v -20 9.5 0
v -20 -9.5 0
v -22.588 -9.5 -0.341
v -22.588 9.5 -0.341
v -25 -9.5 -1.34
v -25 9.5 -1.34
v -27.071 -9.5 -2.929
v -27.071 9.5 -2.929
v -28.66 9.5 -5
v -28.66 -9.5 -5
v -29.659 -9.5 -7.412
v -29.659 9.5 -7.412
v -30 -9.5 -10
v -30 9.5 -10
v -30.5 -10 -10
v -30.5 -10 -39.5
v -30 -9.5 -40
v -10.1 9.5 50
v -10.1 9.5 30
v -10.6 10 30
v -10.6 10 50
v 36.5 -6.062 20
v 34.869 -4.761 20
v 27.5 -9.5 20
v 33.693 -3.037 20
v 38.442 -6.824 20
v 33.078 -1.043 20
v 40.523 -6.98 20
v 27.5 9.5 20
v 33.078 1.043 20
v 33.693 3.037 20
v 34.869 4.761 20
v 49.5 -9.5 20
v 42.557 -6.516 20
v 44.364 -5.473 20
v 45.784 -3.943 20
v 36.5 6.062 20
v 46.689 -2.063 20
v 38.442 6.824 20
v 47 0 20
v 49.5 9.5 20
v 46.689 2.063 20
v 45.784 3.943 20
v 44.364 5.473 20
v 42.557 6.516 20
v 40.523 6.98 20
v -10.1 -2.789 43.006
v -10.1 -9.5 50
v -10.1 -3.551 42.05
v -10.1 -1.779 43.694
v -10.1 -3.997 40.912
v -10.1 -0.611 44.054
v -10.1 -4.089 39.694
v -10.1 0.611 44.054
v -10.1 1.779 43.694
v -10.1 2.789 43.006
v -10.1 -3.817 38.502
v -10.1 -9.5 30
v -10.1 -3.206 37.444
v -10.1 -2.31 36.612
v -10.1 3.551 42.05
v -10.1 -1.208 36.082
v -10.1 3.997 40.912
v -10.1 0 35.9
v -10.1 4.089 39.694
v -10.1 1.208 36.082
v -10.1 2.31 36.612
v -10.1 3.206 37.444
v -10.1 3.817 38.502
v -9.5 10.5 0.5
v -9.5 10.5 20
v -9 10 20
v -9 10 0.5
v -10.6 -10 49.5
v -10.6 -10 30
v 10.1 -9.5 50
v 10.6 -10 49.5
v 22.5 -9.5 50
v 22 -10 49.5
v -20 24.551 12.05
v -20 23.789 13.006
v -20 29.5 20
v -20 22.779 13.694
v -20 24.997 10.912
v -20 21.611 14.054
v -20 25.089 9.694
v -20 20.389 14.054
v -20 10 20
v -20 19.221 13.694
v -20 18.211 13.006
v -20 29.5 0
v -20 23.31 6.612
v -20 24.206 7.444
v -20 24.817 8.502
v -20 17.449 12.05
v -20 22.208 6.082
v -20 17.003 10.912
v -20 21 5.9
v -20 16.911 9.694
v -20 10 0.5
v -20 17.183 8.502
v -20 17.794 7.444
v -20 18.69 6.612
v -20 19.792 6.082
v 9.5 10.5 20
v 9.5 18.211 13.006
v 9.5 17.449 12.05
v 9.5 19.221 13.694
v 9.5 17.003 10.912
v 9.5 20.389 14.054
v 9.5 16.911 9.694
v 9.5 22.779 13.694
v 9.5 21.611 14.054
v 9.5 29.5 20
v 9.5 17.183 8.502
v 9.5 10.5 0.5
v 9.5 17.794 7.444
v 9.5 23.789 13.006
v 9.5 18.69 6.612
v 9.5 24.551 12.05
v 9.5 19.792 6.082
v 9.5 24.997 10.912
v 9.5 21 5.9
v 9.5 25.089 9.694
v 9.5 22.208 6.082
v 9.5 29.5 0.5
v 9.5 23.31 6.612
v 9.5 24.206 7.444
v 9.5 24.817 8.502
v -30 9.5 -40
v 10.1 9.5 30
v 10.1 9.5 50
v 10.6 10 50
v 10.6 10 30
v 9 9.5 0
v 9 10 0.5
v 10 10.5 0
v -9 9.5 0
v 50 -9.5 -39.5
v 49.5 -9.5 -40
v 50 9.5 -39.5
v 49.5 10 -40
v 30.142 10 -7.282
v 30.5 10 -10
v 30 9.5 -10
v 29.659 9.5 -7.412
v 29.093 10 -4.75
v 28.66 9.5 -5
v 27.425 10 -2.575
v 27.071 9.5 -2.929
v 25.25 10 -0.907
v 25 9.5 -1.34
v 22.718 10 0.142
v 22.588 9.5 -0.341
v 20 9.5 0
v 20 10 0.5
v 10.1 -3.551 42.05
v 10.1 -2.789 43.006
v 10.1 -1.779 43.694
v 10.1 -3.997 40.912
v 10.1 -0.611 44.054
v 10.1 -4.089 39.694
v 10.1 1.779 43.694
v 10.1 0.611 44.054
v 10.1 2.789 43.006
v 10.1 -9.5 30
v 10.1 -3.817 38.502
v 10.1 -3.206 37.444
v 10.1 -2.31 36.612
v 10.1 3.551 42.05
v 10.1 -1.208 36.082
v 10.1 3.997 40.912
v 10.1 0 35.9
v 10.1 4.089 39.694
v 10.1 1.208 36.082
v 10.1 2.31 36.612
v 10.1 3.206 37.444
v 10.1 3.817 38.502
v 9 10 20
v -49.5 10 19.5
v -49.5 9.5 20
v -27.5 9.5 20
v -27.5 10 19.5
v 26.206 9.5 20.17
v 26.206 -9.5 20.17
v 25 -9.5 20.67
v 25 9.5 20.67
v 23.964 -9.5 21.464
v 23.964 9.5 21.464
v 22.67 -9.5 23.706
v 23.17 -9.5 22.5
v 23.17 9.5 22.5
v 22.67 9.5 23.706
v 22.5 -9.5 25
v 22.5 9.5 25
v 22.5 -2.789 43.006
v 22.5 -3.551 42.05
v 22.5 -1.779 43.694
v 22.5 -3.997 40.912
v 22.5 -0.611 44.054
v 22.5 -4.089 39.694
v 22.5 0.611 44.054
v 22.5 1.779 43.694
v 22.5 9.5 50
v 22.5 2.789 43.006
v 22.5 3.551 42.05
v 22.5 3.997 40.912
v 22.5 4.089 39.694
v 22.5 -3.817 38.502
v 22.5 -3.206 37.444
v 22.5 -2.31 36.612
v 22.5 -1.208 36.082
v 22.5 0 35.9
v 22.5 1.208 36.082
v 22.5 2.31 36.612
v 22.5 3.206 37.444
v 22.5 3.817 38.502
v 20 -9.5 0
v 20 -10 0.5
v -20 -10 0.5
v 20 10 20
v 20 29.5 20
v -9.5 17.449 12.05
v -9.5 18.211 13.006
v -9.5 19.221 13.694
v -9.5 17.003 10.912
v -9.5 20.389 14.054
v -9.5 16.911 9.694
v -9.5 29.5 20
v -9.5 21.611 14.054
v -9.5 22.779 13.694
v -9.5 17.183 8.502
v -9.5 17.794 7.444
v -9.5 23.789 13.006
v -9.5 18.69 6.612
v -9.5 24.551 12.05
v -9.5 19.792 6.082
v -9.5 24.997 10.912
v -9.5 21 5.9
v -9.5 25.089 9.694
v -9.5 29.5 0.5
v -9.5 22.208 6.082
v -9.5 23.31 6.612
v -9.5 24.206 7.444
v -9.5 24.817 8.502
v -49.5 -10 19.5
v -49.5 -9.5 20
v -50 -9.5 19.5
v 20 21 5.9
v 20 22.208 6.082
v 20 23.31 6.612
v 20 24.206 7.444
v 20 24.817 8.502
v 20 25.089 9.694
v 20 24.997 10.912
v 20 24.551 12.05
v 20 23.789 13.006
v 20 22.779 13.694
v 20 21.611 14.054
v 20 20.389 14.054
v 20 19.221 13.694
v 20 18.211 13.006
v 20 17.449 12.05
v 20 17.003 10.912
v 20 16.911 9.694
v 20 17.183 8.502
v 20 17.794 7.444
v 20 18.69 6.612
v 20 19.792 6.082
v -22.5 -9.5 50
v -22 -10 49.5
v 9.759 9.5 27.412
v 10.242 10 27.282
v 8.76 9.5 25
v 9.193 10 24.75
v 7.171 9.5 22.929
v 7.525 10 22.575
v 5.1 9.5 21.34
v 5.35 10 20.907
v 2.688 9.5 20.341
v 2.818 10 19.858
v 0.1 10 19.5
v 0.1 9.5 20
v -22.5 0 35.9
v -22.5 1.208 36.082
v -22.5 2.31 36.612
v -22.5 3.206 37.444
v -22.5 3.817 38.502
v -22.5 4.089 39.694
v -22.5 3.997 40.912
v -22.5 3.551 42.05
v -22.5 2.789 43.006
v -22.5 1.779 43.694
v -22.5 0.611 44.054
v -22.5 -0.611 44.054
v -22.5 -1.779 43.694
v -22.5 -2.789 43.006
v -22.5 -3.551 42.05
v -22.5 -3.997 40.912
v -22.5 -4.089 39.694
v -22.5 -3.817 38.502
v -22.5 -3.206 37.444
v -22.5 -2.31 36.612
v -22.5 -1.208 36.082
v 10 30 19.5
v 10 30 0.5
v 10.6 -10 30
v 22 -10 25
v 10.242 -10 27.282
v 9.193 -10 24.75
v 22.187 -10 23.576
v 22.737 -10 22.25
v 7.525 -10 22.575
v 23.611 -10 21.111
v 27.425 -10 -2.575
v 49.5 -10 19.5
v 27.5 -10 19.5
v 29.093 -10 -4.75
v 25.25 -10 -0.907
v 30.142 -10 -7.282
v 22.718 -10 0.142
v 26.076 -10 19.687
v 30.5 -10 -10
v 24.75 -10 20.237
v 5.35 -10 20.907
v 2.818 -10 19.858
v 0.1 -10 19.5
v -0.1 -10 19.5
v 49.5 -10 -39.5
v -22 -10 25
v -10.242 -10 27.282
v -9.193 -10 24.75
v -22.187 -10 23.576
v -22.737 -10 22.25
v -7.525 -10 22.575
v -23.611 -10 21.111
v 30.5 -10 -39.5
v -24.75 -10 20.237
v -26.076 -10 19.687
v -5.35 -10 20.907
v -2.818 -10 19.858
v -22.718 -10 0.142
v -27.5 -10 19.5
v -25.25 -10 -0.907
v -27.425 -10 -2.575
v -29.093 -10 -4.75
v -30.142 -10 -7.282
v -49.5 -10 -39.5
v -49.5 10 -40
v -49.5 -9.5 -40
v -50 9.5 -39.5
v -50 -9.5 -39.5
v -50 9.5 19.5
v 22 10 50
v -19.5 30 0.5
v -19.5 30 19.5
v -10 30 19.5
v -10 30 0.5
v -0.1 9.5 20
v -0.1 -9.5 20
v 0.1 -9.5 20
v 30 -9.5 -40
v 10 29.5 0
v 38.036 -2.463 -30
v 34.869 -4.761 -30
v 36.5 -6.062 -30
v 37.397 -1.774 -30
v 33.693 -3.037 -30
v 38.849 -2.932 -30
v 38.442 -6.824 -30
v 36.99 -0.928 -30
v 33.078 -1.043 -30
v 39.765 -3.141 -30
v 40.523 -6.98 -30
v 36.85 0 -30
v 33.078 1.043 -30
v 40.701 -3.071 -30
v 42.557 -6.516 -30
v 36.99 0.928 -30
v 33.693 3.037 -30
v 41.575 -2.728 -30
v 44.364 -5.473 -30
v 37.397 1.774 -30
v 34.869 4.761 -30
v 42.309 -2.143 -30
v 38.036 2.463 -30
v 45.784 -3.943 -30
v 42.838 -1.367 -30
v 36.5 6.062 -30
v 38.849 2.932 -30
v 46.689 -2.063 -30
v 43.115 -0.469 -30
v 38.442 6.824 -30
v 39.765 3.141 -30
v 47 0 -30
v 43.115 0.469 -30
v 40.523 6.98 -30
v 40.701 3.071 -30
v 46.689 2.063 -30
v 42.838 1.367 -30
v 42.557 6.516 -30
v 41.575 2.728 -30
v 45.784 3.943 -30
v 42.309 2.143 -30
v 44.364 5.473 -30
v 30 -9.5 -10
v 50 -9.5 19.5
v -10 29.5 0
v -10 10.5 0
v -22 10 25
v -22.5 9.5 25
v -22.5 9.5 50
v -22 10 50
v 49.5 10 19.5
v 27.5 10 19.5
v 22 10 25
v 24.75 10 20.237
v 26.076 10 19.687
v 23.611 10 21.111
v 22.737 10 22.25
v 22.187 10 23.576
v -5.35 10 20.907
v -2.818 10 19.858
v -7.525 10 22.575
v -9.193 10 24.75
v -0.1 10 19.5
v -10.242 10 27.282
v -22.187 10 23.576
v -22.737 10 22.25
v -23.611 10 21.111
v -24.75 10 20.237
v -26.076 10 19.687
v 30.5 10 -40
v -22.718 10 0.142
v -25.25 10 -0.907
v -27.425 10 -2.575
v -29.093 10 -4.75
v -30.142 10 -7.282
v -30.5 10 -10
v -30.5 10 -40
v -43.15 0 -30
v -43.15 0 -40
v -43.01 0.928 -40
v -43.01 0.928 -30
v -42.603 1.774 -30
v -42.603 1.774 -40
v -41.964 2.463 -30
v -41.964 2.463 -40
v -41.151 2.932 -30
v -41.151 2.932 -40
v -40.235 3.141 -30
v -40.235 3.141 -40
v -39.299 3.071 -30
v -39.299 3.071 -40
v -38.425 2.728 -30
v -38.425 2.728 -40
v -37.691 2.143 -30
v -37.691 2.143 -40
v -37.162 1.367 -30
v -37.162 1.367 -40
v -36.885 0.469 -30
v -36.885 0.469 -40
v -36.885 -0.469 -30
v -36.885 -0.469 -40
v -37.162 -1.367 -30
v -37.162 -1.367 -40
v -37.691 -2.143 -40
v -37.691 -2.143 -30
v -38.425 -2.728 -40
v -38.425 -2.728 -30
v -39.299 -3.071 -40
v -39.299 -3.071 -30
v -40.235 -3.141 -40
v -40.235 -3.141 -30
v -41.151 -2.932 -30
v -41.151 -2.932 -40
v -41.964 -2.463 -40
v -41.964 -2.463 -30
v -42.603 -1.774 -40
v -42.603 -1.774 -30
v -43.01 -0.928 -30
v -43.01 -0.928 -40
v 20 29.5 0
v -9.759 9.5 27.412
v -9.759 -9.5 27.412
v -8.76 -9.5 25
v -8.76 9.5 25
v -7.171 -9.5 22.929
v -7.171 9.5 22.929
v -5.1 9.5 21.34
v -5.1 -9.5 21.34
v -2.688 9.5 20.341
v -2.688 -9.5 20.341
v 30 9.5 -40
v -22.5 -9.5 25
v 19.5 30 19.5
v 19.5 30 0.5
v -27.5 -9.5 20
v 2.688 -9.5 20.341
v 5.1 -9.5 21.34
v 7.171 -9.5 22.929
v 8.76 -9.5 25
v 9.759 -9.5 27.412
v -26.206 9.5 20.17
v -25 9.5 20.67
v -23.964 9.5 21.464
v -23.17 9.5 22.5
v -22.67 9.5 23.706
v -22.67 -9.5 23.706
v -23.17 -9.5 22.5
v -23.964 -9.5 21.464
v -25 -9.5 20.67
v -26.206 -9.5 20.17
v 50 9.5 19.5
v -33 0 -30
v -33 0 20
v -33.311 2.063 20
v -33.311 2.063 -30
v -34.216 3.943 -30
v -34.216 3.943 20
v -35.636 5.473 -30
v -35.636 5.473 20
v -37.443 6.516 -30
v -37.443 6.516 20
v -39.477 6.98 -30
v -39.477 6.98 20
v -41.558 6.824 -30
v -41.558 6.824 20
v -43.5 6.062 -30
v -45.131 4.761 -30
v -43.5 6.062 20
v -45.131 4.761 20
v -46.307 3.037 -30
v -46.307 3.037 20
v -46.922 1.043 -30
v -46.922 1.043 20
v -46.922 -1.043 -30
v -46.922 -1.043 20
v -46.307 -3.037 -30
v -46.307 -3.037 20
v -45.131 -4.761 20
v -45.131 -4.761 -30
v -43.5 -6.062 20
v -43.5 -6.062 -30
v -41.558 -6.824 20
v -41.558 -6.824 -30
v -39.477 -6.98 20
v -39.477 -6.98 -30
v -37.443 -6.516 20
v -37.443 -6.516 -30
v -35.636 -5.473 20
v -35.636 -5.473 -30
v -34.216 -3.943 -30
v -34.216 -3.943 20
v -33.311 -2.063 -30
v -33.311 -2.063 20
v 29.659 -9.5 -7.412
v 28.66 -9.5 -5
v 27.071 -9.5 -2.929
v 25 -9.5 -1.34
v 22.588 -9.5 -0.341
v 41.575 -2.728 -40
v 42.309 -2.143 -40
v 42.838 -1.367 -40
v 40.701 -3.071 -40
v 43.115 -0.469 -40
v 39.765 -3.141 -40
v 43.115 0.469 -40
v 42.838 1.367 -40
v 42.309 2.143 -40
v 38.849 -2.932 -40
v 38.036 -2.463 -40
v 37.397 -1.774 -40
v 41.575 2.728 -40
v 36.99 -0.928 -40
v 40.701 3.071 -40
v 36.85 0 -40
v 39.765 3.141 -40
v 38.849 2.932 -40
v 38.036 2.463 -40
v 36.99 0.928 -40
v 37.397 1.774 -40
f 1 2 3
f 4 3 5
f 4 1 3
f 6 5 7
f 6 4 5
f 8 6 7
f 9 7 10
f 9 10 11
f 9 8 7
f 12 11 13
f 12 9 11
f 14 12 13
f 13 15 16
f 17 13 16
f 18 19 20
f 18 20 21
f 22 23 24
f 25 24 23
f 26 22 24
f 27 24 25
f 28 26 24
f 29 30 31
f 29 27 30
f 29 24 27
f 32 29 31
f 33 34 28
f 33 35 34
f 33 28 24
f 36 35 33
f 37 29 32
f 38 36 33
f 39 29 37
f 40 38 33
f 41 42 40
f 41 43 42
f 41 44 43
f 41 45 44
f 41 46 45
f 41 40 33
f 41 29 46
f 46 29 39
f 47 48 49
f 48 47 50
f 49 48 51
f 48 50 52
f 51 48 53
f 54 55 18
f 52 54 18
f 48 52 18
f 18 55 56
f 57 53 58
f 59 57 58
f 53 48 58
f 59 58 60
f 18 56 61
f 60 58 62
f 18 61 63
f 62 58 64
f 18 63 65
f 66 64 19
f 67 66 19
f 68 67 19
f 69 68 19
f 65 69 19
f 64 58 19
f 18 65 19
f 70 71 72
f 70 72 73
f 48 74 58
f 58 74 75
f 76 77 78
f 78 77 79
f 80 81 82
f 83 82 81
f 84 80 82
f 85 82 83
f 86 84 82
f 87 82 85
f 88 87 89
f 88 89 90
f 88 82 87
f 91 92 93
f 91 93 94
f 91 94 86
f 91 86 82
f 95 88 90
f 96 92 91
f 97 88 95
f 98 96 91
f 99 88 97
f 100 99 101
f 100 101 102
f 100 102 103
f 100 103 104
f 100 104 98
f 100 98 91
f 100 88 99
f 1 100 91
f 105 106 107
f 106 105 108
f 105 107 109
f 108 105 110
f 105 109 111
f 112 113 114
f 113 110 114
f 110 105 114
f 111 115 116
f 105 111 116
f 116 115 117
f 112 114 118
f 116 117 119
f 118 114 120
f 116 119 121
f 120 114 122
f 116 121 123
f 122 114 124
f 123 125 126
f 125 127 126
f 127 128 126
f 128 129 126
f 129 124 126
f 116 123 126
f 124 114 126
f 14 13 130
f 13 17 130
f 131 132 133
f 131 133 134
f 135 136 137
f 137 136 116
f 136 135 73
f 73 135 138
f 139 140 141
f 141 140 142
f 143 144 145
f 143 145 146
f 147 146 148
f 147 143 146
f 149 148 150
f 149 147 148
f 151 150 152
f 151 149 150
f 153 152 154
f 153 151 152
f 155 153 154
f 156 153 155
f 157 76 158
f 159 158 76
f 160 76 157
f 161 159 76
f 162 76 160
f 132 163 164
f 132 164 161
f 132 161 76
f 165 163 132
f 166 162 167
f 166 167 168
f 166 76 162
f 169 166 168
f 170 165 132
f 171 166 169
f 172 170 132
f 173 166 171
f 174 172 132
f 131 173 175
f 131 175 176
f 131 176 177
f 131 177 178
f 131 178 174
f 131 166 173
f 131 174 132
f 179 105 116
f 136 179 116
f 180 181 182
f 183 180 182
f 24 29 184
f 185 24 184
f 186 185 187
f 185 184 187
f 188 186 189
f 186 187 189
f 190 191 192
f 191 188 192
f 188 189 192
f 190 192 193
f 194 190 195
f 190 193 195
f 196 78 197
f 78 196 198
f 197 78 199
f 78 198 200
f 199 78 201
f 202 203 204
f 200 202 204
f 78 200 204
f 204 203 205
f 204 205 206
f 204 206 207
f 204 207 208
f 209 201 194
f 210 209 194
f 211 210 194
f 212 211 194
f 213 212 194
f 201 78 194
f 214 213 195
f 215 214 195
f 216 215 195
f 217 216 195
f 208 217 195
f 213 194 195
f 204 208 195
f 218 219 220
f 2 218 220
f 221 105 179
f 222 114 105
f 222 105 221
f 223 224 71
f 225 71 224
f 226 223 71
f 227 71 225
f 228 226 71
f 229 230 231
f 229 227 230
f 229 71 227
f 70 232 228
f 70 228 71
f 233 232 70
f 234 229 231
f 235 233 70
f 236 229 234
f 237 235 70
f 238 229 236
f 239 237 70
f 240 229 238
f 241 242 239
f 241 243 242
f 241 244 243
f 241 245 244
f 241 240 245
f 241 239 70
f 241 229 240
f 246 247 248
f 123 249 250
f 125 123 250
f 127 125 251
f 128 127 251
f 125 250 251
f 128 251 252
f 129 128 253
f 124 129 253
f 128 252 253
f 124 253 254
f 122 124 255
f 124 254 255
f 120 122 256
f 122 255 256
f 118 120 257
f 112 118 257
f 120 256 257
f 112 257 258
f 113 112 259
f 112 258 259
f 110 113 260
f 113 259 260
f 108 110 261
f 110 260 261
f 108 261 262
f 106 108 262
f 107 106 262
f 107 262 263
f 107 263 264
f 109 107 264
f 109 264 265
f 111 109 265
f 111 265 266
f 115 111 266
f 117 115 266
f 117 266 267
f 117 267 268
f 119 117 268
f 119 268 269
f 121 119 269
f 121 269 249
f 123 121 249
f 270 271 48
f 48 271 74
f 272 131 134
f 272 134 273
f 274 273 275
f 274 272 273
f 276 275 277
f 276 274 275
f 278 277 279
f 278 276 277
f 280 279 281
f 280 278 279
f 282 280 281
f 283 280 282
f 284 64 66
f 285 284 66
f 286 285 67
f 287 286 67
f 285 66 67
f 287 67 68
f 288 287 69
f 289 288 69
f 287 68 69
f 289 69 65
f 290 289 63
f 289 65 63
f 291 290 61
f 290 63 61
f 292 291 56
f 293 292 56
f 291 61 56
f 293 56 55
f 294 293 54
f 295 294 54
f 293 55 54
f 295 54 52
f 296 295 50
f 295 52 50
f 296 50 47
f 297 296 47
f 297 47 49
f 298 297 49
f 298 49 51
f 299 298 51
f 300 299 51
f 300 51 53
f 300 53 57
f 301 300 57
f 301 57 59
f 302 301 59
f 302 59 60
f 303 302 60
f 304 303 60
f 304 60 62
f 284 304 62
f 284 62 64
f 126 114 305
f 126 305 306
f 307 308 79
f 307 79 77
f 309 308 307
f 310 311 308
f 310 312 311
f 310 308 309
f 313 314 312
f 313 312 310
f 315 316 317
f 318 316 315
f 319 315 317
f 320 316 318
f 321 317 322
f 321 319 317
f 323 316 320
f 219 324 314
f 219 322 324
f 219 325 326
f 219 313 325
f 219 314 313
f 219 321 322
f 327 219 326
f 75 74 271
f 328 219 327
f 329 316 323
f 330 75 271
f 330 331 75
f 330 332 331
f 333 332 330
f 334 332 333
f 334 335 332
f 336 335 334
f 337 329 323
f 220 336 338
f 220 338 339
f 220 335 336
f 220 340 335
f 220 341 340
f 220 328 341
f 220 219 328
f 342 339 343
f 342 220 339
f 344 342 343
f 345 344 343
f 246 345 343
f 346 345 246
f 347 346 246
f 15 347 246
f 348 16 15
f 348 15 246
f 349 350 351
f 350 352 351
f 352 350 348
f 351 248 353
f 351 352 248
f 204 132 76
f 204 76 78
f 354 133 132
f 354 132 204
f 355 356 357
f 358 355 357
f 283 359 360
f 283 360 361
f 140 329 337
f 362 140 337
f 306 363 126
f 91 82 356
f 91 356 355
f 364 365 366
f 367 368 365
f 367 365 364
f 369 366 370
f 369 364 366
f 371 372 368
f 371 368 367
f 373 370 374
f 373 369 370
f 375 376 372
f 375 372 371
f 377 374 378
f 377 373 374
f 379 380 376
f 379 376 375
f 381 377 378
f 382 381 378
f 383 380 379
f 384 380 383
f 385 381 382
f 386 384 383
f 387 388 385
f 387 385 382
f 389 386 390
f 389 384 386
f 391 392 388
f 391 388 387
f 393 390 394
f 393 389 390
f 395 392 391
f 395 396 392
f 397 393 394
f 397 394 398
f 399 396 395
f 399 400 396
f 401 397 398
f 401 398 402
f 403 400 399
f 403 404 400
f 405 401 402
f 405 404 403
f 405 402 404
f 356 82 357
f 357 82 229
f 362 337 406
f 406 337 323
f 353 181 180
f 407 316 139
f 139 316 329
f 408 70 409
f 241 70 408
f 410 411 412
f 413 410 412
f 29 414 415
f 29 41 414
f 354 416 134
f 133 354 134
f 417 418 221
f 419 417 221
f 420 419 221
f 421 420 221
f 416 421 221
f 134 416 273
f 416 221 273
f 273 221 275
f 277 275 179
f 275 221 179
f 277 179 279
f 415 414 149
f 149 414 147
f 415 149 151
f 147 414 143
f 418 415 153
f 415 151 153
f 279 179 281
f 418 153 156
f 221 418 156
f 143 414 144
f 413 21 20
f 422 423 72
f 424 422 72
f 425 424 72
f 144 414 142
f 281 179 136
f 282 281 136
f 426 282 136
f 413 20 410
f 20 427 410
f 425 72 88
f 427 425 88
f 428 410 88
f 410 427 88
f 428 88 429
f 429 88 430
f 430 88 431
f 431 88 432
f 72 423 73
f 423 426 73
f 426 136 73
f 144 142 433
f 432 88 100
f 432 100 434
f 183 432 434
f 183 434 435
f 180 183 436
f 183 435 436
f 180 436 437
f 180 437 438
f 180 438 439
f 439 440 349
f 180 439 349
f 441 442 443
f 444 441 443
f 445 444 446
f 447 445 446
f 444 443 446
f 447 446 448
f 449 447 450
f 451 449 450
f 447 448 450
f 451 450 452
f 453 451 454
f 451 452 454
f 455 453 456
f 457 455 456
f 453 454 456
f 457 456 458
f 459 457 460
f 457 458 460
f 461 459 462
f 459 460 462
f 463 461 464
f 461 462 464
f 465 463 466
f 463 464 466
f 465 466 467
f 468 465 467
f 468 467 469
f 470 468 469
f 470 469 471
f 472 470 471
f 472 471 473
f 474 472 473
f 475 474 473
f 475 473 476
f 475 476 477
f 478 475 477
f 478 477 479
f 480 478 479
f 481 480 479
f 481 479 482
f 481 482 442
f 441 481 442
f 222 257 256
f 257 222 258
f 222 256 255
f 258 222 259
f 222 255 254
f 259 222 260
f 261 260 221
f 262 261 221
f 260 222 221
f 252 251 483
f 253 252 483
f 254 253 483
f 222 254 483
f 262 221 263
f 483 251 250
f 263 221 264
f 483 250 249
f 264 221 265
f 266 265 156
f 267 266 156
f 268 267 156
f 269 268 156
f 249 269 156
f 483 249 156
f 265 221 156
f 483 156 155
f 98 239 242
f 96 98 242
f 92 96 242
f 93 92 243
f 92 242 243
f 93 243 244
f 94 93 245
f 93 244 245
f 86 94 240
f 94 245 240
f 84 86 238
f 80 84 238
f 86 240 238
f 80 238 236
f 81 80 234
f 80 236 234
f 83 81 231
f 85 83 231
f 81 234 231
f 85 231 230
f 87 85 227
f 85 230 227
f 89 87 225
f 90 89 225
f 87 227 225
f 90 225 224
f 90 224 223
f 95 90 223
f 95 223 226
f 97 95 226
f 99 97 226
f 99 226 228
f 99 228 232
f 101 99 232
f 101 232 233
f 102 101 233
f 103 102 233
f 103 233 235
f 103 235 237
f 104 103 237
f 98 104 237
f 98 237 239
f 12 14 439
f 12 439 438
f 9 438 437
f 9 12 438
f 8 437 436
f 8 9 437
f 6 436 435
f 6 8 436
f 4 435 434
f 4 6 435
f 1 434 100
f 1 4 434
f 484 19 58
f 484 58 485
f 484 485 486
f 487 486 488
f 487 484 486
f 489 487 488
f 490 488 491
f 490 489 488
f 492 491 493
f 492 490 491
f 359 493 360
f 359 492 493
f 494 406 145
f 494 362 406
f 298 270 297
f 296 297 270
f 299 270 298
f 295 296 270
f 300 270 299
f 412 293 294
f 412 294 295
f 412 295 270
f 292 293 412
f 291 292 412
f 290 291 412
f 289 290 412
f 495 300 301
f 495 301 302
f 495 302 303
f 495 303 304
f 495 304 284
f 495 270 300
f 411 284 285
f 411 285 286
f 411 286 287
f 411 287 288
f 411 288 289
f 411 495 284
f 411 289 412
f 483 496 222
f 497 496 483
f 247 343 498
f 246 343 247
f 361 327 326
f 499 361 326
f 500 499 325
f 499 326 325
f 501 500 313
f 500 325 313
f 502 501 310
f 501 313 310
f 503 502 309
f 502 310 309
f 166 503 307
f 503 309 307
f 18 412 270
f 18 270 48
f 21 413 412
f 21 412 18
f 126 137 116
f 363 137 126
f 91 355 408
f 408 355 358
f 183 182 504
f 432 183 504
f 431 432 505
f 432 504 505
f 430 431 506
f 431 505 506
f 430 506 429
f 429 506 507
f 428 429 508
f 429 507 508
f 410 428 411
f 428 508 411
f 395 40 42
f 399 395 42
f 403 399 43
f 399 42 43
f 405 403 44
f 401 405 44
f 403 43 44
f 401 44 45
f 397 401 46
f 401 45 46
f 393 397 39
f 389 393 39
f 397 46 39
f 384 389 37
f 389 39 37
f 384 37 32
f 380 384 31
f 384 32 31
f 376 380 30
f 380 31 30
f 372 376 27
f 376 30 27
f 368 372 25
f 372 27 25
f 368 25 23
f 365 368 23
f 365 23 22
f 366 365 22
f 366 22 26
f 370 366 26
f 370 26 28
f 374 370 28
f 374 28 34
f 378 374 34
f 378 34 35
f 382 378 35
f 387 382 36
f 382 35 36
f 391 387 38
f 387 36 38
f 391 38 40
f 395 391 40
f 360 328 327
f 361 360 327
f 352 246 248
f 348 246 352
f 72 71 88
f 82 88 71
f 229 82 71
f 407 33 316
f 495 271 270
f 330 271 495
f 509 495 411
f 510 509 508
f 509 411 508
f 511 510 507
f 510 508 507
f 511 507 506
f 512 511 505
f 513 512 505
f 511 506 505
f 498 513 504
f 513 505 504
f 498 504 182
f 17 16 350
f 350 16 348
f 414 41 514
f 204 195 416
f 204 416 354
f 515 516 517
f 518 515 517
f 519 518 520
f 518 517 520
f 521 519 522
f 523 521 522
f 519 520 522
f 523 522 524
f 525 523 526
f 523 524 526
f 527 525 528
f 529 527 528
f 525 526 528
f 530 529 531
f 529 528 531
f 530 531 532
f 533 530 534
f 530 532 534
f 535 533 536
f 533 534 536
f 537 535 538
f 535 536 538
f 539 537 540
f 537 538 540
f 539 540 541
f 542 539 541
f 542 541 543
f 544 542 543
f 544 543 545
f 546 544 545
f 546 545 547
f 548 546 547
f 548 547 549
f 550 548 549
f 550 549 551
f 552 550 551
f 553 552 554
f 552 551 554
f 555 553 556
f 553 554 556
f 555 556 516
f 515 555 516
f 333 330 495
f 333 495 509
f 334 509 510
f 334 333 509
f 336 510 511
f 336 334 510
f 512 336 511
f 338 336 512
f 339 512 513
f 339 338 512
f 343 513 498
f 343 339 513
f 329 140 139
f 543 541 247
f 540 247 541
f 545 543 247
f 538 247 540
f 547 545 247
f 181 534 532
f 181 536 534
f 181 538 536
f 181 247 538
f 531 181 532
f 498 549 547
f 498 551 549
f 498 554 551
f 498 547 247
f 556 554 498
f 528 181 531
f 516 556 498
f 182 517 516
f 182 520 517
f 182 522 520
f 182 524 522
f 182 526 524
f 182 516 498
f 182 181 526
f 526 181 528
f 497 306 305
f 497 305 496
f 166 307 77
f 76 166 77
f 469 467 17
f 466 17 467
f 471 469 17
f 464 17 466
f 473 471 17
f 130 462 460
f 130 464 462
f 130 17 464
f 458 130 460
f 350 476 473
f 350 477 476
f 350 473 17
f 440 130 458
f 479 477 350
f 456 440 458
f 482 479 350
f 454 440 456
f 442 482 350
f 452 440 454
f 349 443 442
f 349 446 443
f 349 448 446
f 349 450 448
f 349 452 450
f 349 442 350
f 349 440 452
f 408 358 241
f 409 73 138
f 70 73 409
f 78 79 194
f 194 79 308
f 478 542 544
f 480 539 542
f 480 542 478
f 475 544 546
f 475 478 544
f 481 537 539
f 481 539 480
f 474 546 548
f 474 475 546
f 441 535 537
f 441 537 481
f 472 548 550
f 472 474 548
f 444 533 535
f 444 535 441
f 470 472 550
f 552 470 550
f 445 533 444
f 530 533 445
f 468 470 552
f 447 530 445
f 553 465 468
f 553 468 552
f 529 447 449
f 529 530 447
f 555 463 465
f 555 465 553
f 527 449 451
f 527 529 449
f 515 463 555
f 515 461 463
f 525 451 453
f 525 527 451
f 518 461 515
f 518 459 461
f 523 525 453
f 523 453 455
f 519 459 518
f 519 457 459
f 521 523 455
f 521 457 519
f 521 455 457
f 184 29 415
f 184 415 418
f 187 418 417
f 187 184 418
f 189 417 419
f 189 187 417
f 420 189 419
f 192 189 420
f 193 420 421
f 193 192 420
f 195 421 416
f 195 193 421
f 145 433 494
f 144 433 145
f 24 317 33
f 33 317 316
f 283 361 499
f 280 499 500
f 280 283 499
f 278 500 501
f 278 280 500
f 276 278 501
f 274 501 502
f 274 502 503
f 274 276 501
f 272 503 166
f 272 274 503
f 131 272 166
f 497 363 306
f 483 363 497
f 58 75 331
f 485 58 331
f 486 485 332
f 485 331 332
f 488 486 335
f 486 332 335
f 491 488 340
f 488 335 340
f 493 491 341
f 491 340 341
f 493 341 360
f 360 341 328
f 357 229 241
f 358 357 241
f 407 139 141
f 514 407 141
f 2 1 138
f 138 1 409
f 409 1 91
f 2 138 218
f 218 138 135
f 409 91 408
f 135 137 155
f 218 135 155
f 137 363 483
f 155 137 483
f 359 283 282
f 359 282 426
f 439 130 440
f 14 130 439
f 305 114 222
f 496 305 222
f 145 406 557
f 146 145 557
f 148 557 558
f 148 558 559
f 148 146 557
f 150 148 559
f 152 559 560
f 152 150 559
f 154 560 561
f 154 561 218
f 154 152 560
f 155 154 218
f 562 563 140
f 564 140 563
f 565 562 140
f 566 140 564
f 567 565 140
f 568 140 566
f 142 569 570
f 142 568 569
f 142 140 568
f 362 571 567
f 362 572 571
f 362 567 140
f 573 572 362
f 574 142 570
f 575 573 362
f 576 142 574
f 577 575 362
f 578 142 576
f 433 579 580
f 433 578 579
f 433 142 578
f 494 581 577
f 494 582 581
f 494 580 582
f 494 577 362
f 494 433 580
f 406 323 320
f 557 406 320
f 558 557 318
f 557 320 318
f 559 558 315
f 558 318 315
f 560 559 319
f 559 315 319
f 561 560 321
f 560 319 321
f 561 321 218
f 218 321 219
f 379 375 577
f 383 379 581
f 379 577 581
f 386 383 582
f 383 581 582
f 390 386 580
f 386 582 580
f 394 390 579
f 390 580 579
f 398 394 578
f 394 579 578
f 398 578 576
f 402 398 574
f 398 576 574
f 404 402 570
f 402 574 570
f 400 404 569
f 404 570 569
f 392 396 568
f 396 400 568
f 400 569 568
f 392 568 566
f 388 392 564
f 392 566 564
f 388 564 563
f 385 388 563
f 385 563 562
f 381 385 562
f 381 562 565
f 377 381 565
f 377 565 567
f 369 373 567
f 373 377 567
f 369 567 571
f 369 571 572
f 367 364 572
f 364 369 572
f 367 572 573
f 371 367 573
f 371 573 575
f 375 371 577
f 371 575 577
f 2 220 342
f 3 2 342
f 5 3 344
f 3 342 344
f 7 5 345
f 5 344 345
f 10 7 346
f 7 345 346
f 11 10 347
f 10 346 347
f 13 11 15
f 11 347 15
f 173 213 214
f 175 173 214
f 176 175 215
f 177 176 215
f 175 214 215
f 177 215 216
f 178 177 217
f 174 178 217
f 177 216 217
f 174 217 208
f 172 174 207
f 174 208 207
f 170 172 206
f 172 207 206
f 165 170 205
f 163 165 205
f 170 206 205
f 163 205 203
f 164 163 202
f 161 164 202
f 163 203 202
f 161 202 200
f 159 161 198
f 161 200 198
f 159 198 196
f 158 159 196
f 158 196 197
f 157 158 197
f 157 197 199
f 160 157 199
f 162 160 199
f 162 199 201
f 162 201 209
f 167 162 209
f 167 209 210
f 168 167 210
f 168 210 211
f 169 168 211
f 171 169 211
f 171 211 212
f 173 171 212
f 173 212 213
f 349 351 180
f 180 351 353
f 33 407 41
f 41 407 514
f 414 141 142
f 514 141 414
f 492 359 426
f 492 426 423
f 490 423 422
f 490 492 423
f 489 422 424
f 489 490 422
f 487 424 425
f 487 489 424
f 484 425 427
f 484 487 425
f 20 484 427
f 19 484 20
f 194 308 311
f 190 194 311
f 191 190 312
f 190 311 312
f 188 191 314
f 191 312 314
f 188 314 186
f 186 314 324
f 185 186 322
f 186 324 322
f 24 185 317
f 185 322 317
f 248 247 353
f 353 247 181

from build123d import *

# Parameters (mm, degrees)
SKETCH1_W           = 100
SKETCH1_H           = 20
SKETCH1_R           = 3.15
BOSS_EXTRUDE1_DEPTH = 20
SKETCH8_W           = 40
SKETCH8_H           = 20
BOSS_EXTRUDE2_DEPTH = 20
SKETCH9_W           = 19
SKETCH9_H           = 40
CUT_EXTRUDE5_DEPTH  = 20
SKETCH10_R          = 4.1
CUT_EXTRUDE6_DEPTH  = 79.74007874
SKETCH11_W          = 12.4
SKETCH11_H          = 20
BOSS_EXTRUDE3_DEPTH = 30
FILLET1_R           = 10
FILLET2_R           = 5
SKETCH12_R          = 4.1
CUT_EXTRUDE7_DEPTH  = 94.03897033
BOSS_EXTRUDE4_START = 40
SKETCH13_W          = 20
SKETCH13_H          = 20
SKETCH13_R          = 3.15
BOSS_EXTRUDE4_DEPTH = 40
FILLET3_R           = 10
CHAMFER1_SIZE       = 0.5
SKETCH5_R           = 7
CUT_EXTRUDE3_DEPTH  = 50


with BuildPart() as part:
    # Sketch1 → Boss-Extrude1 (new body)
    with BuildSketch(Plane.XY):
        Rectangle(SKETCH1_W, SKETCH1_H)
        with Locations((-40, 0)):
            Circle(SKETCH1_R, mode=Mode.SUBTRACT)
        with Locations((40, 0)):
            Circle(SKETCH1_R, mode=Mode.SUBTRACT)
    extrude(amount=BOSS_EXTRUDE1_DEPTH)

    # Sketch8 → Boss-Extrude2 (add)
    with BuildSketch(Plane(origin=(0, 10, 0), x_dir=(1, 0, 0), z_dir=(0, 1, 0))):
        with Locations((0, -10)):
            Rectangle(SKETCH8_W, SKETCH8_H)
    extrude(amount=BOSS_EXTRUDE2_DEPTH)

    # Sketch9 → Cut-Extrude5 (cut)
    with BuildSketch(Plane(origin=(0, 30, 0), x_dir=(1, 0, 0), z_dir=(0, 1, 0))):
        Rectangle(SKETCH9_W, SKETCH9_H)
    extrude(amount=-CUT_EXTRUDE5_DEPTH, mode=Mode.SUBTRACT)

    # Sketch10 → Cut-Extrude6 (cut, through all)
    with BuildSketch(Plane(origin=(20, 0, 0), x_dir=(0, 0, -1), z_dir=(1, 0, 0))):
        with Locations((-10, 21)):
            Circle(SKETCH10_R)
    extrude(amount=-CUT_EXTRUDE6_DEPTH, mode=Mode.SUBTRACT)

    # Sketch11 → Boss-Extrude3 (add)
    with BuildSketch(Plane.XY.offset(20)):
        with Locations((-16.3, 0)):
            Rectangle(SKETCH11_W, SKETCH11_H)
        with Locations((16.3, 0)):
            Rectangle(SKETCH11_W, SKETCH11_H)
    extrude(amount=BOSS_EXTRUDE3_DEPTH)

    # Fillet1
    # the kernel refuses this fillet: 10 mm, written as the material it adds along each edge
    with BuildSketch(Plane(origin=(-10.1, 10, 20), x_dir=(1, 0, 0), z_dir=(0, -1, 0))) as fillet1_piece_1:
        with BuildLine():
            CenterArc((FILLET1_R, FILLET1_R), FILLET1_R, 180, 90)
            Line((0, FILLET1_R), (0, 0))
            Line((0, 0), (FILLET1_R, 0))
        make_face()
    extrude(amount=20)
    with BuildSketch(Plane(origin=(10.1, 10, 20), x_dir=(-1, 0, 0), z_dir=(0, -1, 0))) as fillet1_piece_2:
        with BuildLine():
            CenterArc((FILLET1_R, -FILLET1_R), FILLET1_R, 90, 90)
            Line((0, -FILLET1_R), (0, 0))
            Line((0, 0), (FILLET1_R, 0))
        make_face()
    extrude(amount=20)

    # Fillet2
    fillet2_edges = [part.edges().sort_by_distance(p)[0] for p in [
        (-22.5, 0, 20),
        (22.5, 0, 20),
    ]]
    fillet(fillet2_edges, radius=FILLET2_R)

    # Sketch12 → Cut-Extrude7 (cut, through all)
    with BuildSketch(Plane(origin=(22.5, 0, 0), x_dir=(0, 0, -1), z_dir=(1, 0, 0))):
        with Locations((-40, 0)):
            Circle(SKETCH12_R)
    extrude(amount=-CUT_EXTRUDE7_DEPTH, mode=Mode.SUBTRACT)

    # Sketch13 → Boss-Extrude4 (add)
    # profile 1 of 2: a face of its own
    with BuildSketch(Plane(origin=(0, 0, 0), x_dir=(-1, 0, 0), z_dir=(0, 0, -1)).offset(BOSS_EXTRUDE4_START)):
        with Locations((-40, 0)):
            Rectangle(SKETCH13_W, SKETCH13_H)
        with Locations((-40, 0)):
            Circle(SKETCH13_R, mode=Mode.SUBTRACT)
    # profile 2 of 2: a face of its own
    with BuildSketch(Plane(origin=(0, 0, 0), x_dir=(-1, 0, 0), z_dir=(0, 0, -1)).offset(BOSS_EXTRUDE4_START)):
        with Locations((40, 0)):
            Rectangle(SKETCH13_W, SKETCH13_H)
        with Locations((40, 0)):
            Circle(SKETCH13_R, mode=Mode.SUBTRACT)
    extrude(amount=-BOSS_EXTRUDE4_DEPTH)

    # Fillet3
    fillet3_edges = [part.edges().sort_by_distance(p)[0] for p in [
        (-30, 0, 0),
        (30, 0, 0),
    ]]
    fillet(fillet3_edges, radius=FILLET3_R)

    # Chamfer1
    chamfer1_edges = [part.edges().sort_by_distance(p)[0] for p in [
        (-7.171067812, -10, 22.928932188),
        (-50, 0, 20),
        (-38.75, 10, 20),
        (38.75, -10, 20),
        (-23.964466094, -10, 21.464466094),
        (-23.964466094, 10, 21.464466094),
        (23.964466094, 10, 21.464466094),
        (23.964466094, -10, 21.464466094),
        (50, 0, -40),
        (40, -10, -40),
        (30, -10, -25),
        (30, 10, -25),
        (-50, 0, -40),
        (-40, -10, -40),
        (-38.75, -10, 20),
        (-30, 10, -25),
        (-30, -10, -25),
        (0, -10, 0),
        (-27.071067812, -10, -2.928932188),
        (-27.071067812, 10, -2.928932188),
        (27.071067812, 10, -2.928932188),
        (27.071067812, -10, -2.928932188),
        (-20, 30, 10),
        (-14.75, 30, 20),
        (20, 30, 10),
        (14.75, 30, 0),
        (14.75, 30, 20),
        (-14.75, 30, 0),
        (-9.5, 30, 10),
        (0, 10, 0),
        (9.5, 20, 0),
        (-9.5, 20, 0),
        (9.5, 10, 10),
        (-9.5, 10, 10),
        (9.5, 30, 10),
        (50, 0, 20),
        (-22.5, 10, 37.5),
        (-22.5, -10, 37.5),
        (-10.1, -10, 40),
        (-10.1, 10, 40),
        (-16.3, -10, 50),
        (50, -10, -10),
        (-50, -10, -10),
        (22.5, -10, 37.5),
        (-50, 10, -10),
        (22.5, 10, 37.5),
        (10.1, 10, 40),
        (50, 10, -10),
        (10.1, -10, 40),
        (16.3, -10, 50),
        (38.75, 10, 20),
        (0, 10, 20),
        (0, -10, 20),
        (7.171067812, -10, 22.928932188),
        (7.171067812, 10, 22.928932188),
        (-7.171067812, 10, 22.928932188),
    ]]
    chamfer(chamfer1_edges, length=CHAMFER1_SIZE)

    # Sketch5 → Cut-Extrude3 (cut)
    with BuildSketch(Plane.XY.offset(20)):
        with Locations((-40, 0)):
            Circle(SKETCH5_R)
        with Locations((40, 0)):
            Circle(SKETCH5_R)
    extrude(amount=-CUT_EXTRUDE3_DEPTH, mode=Mode.SUBTRACT)


solid = part.part
